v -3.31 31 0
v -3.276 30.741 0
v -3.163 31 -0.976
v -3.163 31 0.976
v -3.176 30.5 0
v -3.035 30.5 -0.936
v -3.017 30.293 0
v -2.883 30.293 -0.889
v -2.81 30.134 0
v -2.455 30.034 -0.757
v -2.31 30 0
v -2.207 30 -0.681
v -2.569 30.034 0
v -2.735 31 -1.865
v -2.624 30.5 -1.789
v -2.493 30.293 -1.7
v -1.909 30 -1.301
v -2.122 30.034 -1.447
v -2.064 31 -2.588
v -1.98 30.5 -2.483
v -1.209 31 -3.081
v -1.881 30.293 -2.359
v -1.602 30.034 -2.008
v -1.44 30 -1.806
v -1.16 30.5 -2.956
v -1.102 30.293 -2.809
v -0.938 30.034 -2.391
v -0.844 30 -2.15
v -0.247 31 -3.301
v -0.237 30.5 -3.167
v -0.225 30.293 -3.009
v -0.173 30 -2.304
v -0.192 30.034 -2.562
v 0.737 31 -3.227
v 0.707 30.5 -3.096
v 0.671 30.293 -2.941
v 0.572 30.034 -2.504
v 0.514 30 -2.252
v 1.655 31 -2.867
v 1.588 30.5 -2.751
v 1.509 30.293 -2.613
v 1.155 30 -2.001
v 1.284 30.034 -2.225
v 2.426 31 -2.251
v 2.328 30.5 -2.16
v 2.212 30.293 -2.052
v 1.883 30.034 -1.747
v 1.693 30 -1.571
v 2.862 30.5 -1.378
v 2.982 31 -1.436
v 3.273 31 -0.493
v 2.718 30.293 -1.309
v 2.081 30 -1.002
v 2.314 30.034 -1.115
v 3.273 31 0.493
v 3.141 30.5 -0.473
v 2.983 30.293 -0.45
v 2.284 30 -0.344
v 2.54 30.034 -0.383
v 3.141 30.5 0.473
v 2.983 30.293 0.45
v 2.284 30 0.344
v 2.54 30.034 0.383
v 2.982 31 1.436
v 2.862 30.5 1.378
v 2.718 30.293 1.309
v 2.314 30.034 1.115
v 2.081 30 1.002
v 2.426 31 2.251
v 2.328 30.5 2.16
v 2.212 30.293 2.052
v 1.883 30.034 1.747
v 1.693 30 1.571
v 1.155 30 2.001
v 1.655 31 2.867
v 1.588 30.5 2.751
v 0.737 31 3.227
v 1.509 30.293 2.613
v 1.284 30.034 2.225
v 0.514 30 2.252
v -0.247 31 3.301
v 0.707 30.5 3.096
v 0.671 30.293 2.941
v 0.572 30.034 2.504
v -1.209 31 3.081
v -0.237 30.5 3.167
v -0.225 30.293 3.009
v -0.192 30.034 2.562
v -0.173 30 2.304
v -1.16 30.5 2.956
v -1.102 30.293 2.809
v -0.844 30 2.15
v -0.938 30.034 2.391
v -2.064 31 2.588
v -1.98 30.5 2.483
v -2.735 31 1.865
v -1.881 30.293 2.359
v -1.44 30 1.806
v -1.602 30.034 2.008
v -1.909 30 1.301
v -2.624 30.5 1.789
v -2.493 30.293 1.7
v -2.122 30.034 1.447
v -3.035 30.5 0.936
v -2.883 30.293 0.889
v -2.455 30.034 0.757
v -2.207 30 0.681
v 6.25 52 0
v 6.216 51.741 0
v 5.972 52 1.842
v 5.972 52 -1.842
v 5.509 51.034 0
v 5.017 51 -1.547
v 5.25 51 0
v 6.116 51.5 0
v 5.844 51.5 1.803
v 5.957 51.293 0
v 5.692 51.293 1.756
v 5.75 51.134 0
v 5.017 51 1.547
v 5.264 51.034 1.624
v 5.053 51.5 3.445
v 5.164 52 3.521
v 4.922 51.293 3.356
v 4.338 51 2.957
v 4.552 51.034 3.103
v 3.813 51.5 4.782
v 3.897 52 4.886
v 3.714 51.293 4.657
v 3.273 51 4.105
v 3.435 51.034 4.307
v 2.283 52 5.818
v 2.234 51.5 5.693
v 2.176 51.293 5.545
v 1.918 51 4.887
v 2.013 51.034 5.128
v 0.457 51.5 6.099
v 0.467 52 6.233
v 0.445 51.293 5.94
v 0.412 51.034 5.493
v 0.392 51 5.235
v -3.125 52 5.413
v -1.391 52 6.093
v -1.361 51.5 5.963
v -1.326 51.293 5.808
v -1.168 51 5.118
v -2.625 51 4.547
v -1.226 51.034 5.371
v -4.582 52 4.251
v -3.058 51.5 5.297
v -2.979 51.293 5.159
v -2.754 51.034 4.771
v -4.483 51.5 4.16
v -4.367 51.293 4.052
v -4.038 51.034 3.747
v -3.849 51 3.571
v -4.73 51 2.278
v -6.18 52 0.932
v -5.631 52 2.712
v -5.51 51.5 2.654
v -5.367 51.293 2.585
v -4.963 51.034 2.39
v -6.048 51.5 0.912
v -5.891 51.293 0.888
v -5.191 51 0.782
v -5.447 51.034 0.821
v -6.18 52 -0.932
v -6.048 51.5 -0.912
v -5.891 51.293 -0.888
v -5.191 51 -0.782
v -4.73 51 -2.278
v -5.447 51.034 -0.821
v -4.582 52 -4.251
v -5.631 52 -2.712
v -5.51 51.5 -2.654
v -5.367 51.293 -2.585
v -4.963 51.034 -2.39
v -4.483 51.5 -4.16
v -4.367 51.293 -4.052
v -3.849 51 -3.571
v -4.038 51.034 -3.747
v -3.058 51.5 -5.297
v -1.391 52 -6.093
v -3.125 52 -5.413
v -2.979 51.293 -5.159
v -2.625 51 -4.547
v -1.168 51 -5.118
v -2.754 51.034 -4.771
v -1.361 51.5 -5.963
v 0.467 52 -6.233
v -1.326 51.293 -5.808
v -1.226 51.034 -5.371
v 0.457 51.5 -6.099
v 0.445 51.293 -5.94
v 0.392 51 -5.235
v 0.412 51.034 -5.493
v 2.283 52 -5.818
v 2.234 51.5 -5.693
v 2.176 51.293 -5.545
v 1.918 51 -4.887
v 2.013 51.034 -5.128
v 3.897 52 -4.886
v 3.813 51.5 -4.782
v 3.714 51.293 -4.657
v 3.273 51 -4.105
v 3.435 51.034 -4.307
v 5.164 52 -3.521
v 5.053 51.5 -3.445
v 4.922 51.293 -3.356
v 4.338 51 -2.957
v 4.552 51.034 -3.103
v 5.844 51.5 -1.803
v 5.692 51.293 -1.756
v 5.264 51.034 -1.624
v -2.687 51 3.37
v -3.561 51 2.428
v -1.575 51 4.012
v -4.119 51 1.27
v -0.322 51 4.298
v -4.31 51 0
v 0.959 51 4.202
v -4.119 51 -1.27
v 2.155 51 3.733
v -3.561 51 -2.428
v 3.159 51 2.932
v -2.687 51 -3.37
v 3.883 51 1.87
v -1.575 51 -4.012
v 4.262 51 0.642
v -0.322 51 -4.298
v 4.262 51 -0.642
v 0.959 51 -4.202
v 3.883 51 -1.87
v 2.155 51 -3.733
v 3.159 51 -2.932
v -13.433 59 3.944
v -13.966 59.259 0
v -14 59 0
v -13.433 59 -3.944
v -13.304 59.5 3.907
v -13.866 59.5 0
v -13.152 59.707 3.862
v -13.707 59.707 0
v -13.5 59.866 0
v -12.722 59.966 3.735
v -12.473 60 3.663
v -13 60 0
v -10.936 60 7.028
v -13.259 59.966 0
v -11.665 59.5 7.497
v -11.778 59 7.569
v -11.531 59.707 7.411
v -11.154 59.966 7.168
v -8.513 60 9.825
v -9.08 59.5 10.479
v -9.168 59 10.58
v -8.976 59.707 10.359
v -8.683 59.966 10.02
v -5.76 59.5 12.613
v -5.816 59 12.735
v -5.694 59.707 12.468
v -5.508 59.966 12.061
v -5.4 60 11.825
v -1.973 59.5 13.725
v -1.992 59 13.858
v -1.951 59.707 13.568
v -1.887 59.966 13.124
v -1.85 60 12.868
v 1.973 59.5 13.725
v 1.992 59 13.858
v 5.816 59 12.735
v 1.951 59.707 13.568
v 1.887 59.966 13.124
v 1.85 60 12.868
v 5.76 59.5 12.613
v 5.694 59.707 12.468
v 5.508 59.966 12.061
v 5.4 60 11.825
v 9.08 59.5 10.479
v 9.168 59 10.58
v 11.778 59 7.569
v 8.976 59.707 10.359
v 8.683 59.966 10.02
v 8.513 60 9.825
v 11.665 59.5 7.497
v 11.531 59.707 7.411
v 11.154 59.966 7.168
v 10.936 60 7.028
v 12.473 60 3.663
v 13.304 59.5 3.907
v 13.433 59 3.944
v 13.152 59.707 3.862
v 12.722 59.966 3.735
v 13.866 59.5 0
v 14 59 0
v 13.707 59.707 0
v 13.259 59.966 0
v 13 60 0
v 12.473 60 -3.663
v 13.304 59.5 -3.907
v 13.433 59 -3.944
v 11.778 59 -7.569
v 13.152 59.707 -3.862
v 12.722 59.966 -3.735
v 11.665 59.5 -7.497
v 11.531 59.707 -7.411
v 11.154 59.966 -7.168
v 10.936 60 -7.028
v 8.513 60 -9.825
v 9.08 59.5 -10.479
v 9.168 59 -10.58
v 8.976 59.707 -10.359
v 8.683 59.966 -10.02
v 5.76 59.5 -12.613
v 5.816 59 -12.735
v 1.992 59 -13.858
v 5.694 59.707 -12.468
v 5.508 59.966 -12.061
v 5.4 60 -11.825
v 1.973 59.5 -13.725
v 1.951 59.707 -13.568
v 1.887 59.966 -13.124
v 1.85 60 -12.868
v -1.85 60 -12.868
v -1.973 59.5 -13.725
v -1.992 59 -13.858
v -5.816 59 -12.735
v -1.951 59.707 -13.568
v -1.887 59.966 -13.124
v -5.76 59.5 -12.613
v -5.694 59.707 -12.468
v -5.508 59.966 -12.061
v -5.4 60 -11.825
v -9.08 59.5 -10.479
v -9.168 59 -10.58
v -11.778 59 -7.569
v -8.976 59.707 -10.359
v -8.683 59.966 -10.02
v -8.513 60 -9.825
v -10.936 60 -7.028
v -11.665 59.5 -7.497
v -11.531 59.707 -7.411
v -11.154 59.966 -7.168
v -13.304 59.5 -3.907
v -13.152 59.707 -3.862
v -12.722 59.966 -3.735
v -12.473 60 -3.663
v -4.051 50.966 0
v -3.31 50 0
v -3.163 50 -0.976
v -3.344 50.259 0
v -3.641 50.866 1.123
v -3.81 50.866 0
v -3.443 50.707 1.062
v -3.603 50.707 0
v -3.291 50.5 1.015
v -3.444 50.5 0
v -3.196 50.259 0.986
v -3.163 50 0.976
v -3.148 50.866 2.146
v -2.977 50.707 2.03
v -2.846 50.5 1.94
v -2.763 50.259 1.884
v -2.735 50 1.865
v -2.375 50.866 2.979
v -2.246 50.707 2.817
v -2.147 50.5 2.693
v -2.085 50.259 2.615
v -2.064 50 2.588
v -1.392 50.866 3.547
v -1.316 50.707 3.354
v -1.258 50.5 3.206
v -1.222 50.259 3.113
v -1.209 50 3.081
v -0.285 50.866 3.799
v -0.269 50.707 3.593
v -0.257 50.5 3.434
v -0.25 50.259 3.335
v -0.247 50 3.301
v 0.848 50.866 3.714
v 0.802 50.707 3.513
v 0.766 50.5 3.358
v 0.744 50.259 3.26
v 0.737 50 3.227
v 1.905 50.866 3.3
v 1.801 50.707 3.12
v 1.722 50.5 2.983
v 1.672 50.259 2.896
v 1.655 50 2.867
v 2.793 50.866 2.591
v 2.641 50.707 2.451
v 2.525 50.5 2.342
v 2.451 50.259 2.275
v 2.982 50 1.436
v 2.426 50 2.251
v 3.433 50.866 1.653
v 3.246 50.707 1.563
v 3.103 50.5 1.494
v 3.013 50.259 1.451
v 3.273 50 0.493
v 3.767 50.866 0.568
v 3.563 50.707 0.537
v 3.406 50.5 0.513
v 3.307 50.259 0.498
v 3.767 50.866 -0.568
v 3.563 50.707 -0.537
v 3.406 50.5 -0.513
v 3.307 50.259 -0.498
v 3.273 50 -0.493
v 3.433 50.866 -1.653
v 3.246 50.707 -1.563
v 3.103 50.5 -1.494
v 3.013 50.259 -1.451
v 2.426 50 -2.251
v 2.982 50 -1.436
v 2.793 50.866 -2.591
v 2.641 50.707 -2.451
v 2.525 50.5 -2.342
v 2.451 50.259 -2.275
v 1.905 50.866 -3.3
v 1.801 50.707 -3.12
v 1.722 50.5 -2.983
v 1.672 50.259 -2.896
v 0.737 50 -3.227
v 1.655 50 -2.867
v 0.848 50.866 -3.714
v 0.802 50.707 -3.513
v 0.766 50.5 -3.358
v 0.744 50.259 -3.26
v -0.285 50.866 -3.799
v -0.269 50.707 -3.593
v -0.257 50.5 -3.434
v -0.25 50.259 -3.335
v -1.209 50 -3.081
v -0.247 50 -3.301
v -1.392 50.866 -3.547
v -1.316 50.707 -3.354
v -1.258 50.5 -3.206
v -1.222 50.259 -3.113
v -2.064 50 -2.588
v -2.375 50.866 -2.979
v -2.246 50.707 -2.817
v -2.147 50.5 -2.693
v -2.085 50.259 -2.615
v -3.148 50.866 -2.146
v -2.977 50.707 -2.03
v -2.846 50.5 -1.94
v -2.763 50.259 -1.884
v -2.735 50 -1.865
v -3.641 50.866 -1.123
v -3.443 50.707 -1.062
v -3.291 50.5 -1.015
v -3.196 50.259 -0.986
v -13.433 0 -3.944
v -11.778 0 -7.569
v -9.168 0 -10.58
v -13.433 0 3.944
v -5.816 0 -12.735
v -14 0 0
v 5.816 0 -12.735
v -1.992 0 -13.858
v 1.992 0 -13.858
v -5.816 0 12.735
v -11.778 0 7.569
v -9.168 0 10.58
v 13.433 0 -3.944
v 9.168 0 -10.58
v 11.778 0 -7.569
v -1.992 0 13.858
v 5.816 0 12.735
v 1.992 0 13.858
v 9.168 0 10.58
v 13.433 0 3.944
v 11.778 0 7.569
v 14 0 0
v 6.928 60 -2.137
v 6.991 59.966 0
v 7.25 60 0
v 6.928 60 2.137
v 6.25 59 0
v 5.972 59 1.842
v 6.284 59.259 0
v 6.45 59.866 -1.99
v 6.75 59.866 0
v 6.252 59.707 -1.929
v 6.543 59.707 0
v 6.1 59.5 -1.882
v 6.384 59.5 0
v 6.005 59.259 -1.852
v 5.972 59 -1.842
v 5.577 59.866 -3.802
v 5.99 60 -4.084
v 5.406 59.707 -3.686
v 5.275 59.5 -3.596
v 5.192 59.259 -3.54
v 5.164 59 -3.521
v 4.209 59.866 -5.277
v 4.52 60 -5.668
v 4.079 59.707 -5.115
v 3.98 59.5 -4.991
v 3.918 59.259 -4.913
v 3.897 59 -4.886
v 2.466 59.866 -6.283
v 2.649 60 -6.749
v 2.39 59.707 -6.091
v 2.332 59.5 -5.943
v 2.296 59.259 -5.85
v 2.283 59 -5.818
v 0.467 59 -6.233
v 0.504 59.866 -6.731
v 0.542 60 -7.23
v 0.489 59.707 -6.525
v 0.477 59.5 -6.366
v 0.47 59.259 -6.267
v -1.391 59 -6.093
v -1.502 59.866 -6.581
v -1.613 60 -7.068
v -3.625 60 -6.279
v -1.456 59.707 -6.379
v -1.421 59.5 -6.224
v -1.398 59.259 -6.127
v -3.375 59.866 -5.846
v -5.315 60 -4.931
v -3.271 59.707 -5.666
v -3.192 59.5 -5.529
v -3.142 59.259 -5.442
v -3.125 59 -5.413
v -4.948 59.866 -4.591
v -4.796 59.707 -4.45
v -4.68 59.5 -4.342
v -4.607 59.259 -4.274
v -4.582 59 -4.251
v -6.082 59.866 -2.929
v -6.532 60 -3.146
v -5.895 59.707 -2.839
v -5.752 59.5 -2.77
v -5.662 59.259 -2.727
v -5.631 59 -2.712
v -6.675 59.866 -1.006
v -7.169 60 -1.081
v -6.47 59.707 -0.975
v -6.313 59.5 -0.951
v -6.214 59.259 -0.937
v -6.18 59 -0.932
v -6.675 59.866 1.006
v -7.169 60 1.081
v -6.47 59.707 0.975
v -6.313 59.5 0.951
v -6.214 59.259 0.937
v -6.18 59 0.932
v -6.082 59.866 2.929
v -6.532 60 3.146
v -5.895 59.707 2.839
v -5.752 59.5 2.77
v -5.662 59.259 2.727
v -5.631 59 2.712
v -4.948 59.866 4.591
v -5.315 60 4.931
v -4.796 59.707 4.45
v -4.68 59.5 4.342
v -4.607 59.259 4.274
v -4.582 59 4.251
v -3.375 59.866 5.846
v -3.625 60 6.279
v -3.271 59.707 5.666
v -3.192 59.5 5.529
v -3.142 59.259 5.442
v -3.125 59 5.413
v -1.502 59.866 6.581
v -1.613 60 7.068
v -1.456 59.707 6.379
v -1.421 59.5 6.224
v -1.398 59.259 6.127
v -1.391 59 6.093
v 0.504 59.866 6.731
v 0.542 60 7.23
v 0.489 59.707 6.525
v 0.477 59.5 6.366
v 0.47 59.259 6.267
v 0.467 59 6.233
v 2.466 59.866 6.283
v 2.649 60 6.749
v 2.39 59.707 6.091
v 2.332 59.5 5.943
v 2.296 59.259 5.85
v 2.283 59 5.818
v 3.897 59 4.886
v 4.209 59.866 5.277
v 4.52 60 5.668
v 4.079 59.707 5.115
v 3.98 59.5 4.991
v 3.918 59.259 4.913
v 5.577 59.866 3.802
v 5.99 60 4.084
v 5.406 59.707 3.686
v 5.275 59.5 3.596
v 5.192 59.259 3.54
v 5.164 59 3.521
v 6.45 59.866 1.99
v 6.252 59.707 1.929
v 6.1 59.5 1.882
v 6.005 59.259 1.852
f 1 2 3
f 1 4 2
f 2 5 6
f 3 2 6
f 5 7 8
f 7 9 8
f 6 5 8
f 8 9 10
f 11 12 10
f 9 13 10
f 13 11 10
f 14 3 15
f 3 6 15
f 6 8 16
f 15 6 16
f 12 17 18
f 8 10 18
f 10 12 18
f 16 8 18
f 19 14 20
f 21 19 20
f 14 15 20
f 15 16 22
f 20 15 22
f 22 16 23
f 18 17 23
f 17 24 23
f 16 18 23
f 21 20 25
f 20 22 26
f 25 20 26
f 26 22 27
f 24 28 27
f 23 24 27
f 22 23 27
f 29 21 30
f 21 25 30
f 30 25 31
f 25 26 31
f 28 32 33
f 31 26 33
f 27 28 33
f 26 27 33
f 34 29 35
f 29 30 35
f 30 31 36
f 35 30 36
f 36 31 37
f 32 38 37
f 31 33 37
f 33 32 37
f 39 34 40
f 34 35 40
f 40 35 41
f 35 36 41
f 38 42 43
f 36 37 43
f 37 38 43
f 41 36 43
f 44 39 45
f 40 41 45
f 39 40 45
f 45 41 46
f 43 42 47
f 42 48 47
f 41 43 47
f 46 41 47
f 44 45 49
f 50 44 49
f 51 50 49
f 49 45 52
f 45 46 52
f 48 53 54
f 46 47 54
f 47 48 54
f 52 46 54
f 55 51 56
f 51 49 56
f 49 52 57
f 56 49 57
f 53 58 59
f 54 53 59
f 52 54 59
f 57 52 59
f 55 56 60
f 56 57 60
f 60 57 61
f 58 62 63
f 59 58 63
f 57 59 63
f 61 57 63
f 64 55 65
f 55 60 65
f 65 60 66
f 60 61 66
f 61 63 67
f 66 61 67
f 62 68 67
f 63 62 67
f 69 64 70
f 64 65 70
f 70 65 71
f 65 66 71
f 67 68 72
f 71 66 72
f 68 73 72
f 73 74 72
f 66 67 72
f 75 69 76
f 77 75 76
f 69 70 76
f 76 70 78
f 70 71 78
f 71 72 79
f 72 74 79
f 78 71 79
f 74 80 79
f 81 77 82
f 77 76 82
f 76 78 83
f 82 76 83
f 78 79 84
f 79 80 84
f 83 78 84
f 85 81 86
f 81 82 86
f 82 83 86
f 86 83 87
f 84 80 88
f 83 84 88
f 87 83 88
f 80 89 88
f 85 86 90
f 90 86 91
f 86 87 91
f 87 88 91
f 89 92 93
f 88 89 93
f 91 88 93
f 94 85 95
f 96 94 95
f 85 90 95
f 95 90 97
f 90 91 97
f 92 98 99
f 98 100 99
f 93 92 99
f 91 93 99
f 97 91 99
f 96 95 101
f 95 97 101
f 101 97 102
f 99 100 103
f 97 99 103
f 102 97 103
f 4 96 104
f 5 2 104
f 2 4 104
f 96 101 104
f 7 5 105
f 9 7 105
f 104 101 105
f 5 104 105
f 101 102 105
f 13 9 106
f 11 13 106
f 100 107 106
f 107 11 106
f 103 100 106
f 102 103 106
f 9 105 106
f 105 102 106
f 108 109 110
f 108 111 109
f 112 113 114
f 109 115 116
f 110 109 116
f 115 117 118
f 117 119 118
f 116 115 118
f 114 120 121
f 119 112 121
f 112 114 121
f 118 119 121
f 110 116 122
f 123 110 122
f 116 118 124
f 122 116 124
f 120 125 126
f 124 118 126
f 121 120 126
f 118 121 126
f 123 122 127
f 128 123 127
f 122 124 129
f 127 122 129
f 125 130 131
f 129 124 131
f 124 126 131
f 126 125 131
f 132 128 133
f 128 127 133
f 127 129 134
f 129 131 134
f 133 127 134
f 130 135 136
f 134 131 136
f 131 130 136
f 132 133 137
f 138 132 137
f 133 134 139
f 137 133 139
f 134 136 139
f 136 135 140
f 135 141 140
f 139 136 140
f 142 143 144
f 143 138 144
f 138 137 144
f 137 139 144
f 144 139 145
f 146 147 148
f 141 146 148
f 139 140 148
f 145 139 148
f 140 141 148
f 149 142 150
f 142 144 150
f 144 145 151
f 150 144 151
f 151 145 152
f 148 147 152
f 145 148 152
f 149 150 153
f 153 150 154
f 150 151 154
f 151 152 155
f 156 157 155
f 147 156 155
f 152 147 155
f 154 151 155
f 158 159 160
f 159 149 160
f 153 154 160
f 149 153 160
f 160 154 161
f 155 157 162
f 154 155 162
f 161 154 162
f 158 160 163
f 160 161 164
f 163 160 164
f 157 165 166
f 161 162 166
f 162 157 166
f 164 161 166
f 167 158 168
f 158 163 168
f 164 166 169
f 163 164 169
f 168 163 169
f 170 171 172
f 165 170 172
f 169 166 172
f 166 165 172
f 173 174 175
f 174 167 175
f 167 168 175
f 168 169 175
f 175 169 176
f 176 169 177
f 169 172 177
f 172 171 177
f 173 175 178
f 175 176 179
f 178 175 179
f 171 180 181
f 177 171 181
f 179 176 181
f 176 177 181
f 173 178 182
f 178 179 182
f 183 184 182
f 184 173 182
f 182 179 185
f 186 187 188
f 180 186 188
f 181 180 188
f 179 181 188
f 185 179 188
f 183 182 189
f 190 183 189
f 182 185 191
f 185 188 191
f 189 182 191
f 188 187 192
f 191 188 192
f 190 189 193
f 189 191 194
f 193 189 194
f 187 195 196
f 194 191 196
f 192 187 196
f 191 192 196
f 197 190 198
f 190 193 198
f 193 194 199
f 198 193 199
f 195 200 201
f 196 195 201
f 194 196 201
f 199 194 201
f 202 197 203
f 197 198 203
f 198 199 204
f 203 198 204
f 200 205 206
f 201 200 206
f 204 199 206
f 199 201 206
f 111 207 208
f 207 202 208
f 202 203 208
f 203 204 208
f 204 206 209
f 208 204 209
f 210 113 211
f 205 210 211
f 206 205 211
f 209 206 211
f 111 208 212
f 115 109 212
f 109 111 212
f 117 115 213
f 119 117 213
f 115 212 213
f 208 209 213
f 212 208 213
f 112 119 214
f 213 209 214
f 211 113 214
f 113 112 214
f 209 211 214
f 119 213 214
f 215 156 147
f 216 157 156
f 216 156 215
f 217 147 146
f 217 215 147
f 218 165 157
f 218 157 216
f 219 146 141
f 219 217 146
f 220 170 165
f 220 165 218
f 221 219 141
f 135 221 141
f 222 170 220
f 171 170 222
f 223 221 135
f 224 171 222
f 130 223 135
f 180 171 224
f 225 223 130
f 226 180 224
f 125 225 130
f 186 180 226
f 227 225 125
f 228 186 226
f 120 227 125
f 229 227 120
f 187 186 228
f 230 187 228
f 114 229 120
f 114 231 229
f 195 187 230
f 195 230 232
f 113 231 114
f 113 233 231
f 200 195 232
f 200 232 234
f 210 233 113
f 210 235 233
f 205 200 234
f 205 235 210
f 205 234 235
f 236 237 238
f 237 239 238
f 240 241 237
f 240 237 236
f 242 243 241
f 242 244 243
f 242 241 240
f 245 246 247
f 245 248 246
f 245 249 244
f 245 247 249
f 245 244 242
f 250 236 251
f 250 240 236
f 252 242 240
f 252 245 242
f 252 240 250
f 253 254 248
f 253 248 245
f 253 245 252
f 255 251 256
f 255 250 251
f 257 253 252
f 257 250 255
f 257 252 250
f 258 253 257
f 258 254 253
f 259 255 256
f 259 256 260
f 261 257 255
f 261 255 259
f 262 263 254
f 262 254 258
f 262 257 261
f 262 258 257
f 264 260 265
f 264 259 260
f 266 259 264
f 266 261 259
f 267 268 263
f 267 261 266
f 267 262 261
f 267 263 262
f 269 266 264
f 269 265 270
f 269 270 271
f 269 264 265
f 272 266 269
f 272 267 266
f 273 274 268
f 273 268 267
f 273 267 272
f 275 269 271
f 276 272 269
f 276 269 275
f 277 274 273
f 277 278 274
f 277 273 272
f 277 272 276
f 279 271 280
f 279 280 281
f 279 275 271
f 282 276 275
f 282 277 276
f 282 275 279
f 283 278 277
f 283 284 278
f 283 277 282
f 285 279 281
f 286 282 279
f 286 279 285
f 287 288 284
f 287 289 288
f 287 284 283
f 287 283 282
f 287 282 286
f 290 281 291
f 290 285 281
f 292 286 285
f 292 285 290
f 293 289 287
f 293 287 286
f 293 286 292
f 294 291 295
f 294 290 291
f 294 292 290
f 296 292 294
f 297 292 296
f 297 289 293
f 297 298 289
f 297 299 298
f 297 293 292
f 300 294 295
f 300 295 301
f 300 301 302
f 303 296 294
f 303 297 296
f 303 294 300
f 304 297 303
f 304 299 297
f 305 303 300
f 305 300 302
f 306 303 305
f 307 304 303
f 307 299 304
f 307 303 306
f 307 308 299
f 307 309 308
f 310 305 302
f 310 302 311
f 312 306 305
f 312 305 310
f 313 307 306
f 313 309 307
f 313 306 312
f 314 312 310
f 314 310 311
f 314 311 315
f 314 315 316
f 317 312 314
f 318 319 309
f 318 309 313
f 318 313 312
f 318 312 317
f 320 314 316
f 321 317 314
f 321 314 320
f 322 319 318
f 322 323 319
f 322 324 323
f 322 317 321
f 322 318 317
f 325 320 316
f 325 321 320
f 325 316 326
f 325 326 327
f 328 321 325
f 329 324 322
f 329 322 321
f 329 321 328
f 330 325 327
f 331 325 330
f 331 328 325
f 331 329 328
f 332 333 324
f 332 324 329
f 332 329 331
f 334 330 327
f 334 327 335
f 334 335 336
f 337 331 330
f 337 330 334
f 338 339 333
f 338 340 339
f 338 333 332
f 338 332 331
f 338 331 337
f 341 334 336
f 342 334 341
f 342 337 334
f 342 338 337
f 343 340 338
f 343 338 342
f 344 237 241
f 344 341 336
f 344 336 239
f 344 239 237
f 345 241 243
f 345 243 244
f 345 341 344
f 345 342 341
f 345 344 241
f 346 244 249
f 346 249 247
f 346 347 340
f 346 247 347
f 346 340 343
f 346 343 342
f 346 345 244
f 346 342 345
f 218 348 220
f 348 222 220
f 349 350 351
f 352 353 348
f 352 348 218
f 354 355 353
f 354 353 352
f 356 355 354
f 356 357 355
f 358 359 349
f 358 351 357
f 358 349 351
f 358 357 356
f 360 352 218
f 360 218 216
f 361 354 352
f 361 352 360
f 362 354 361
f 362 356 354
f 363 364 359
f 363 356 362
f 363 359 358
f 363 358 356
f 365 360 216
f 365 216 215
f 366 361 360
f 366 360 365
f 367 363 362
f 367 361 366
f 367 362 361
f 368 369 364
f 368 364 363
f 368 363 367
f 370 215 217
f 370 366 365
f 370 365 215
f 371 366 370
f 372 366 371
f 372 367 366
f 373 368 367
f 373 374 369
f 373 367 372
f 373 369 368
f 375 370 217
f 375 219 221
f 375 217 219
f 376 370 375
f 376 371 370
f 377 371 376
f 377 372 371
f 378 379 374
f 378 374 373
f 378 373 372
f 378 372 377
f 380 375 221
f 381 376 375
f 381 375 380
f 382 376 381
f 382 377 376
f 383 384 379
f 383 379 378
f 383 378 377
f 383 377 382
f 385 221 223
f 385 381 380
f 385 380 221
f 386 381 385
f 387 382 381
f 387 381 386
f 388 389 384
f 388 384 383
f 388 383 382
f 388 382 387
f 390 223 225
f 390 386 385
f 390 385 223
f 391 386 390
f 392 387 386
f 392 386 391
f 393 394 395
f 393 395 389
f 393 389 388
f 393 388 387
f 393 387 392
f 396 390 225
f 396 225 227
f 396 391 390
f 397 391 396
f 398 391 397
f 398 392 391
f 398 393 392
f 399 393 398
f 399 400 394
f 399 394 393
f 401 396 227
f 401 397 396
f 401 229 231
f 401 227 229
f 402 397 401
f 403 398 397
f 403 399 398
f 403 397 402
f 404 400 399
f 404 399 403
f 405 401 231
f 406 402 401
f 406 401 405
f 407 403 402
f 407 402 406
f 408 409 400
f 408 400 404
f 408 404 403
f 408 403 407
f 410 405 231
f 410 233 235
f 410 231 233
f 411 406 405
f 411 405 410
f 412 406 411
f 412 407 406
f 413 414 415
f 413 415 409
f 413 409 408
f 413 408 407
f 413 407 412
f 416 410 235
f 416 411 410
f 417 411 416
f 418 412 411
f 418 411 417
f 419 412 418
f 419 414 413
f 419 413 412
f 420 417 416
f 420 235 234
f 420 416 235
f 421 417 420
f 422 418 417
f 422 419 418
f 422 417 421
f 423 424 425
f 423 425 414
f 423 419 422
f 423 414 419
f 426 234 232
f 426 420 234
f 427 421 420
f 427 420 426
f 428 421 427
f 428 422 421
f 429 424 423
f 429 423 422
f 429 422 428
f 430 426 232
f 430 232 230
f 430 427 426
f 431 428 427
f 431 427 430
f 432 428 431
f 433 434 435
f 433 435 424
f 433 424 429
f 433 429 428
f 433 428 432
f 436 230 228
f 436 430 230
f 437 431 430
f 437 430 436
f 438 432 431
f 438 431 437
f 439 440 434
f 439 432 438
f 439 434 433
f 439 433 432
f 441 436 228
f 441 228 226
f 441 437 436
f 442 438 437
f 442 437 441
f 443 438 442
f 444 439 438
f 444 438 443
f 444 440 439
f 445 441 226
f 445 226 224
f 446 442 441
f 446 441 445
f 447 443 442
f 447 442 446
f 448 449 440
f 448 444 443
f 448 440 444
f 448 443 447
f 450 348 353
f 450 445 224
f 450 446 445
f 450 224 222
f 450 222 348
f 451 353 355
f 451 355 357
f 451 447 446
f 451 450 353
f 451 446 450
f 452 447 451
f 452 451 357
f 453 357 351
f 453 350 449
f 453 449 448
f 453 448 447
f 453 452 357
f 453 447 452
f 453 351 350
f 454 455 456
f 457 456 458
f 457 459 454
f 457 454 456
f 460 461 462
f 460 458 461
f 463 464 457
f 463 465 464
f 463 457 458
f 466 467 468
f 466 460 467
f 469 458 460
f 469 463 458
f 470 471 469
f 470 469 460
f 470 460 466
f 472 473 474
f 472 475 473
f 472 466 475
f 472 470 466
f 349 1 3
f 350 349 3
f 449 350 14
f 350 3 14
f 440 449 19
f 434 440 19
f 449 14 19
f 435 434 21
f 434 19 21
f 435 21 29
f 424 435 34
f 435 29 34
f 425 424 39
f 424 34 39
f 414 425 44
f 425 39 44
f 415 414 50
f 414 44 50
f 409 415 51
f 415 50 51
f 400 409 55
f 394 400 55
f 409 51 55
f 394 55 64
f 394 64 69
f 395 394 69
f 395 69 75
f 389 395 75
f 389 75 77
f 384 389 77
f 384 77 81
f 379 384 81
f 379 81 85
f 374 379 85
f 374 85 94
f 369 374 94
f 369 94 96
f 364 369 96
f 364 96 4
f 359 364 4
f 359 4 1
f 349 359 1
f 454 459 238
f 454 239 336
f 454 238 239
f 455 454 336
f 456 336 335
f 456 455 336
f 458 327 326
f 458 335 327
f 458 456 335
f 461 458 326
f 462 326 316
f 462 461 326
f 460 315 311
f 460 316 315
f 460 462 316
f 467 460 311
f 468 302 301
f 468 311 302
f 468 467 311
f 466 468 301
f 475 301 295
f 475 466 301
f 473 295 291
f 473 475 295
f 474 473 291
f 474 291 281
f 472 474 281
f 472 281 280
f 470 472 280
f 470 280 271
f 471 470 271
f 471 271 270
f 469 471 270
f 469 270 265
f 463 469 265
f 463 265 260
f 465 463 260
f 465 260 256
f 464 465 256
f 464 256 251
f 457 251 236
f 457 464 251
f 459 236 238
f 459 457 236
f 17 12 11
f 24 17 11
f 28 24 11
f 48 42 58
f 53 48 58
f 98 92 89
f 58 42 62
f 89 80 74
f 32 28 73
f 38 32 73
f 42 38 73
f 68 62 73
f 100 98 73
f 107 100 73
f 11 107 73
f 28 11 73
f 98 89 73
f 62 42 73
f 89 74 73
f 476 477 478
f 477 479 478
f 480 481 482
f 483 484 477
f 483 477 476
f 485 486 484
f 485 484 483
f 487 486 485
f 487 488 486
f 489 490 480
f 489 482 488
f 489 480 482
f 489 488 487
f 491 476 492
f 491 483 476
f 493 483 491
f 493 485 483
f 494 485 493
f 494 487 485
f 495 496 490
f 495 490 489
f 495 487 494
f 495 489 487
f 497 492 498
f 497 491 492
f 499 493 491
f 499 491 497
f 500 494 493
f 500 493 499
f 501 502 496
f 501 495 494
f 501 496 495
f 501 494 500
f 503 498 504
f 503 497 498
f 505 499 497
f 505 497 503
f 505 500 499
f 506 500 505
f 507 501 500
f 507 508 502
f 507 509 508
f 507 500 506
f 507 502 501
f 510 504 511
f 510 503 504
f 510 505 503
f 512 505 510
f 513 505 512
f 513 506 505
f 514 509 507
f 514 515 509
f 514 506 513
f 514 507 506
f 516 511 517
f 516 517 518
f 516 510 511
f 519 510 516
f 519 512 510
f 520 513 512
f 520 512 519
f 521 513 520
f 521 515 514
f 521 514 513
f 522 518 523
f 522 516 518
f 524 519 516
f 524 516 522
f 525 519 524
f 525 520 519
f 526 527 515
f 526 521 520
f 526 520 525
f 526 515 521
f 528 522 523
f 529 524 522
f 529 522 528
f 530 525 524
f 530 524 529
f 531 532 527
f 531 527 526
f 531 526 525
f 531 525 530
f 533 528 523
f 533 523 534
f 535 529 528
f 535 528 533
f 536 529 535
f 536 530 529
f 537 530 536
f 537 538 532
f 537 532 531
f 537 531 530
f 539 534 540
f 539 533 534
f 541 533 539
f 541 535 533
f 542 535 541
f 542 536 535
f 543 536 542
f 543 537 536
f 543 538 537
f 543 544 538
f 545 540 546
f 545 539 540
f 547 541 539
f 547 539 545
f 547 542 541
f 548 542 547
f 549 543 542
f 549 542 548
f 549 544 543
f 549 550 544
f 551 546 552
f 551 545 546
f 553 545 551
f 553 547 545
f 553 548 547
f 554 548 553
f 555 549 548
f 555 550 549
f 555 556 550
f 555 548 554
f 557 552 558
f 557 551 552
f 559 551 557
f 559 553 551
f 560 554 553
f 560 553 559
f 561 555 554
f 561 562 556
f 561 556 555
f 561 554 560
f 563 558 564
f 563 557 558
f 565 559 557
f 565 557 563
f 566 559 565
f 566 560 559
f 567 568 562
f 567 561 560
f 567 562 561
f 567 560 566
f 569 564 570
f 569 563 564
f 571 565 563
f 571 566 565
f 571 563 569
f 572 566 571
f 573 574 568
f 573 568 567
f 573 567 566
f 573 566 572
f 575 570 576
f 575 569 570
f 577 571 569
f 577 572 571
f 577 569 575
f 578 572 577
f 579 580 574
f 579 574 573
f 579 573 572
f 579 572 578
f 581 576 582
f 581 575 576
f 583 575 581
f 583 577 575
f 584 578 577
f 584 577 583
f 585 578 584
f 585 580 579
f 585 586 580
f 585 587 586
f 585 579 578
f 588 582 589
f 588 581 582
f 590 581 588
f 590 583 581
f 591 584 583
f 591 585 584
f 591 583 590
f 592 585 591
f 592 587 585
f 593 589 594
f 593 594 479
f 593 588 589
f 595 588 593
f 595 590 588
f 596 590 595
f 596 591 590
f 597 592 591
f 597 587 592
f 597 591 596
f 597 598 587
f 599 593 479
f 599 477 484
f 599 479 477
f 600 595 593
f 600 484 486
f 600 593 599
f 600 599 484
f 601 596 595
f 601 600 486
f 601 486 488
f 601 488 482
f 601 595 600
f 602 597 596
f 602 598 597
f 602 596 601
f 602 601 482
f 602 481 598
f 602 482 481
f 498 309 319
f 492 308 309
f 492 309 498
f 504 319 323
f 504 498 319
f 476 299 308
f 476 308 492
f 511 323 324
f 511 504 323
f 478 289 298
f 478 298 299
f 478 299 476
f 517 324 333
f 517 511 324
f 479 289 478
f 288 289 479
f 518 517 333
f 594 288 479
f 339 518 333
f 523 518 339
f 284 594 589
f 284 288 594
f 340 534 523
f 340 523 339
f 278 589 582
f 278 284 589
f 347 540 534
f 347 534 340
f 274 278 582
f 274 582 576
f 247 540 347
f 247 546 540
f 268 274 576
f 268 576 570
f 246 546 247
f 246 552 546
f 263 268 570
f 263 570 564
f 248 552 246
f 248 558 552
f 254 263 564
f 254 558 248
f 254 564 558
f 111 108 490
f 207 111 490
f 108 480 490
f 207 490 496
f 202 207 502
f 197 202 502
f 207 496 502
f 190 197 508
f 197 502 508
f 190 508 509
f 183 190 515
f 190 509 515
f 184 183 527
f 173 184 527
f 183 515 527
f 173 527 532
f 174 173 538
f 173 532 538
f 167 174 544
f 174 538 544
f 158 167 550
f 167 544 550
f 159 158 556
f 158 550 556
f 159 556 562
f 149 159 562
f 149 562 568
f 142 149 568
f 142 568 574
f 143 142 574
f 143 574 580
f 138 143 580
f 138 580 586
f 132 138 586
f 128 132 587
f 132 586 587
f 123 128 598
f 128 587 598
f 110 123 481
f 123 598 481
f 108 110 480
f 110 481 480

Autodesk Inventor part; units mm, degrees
ref_plane "YZ Plane" through (0, 0, 0) normal (1, 0, 0) x (0, 1, 0)
ref_plane "XZ Plane" through (0, 0, 0) normal (0, 1, 0) x (-1, 0, 0)
ref_plane "XY Plane" through (0, 0, 0) normal (0, 0, 1) x (1, 0, 0)
sketch "Esboço1" plane through (0, 0, 0) normal (0, 1, 0) x (-1, 0, 0)
  circle A0 centre (0, 0) radius 3.31
  circle A1 centre (0, 0) radius 14
  dimension "d2" = 6.62
  dimension "d3" = 28
extrude "Extrusão1" add sketch "Esboço1" along normal blind 60
sketch "Esboço2" plane through (0, 60, 0) normal (0, 1, 0) x (1, 0, 0)
  circle A0 centre (0, 0) radius 6.25
  dimension "d7" = 12.5
extrude "Extrusão2" cut sketch "Esboço2" against normal blind 9
sketch "Esboço3" plane through (0, 0, 0) normal (0, -1, 0) x (1, 0, 0)
  circle A0 centre (0, 0) radius 3.31
extrude "Extrusão3" add sketch "Esboço3" against normal blind 30
fillet "Arredondamento1" radius 1 5 edges at (14, 60, 0) (-6.25, 60, 0) (-6.25, 51, 0) (3.31, 51, 0) (3.31, 30, 0)
properties part number "peça encaixe telhado"
